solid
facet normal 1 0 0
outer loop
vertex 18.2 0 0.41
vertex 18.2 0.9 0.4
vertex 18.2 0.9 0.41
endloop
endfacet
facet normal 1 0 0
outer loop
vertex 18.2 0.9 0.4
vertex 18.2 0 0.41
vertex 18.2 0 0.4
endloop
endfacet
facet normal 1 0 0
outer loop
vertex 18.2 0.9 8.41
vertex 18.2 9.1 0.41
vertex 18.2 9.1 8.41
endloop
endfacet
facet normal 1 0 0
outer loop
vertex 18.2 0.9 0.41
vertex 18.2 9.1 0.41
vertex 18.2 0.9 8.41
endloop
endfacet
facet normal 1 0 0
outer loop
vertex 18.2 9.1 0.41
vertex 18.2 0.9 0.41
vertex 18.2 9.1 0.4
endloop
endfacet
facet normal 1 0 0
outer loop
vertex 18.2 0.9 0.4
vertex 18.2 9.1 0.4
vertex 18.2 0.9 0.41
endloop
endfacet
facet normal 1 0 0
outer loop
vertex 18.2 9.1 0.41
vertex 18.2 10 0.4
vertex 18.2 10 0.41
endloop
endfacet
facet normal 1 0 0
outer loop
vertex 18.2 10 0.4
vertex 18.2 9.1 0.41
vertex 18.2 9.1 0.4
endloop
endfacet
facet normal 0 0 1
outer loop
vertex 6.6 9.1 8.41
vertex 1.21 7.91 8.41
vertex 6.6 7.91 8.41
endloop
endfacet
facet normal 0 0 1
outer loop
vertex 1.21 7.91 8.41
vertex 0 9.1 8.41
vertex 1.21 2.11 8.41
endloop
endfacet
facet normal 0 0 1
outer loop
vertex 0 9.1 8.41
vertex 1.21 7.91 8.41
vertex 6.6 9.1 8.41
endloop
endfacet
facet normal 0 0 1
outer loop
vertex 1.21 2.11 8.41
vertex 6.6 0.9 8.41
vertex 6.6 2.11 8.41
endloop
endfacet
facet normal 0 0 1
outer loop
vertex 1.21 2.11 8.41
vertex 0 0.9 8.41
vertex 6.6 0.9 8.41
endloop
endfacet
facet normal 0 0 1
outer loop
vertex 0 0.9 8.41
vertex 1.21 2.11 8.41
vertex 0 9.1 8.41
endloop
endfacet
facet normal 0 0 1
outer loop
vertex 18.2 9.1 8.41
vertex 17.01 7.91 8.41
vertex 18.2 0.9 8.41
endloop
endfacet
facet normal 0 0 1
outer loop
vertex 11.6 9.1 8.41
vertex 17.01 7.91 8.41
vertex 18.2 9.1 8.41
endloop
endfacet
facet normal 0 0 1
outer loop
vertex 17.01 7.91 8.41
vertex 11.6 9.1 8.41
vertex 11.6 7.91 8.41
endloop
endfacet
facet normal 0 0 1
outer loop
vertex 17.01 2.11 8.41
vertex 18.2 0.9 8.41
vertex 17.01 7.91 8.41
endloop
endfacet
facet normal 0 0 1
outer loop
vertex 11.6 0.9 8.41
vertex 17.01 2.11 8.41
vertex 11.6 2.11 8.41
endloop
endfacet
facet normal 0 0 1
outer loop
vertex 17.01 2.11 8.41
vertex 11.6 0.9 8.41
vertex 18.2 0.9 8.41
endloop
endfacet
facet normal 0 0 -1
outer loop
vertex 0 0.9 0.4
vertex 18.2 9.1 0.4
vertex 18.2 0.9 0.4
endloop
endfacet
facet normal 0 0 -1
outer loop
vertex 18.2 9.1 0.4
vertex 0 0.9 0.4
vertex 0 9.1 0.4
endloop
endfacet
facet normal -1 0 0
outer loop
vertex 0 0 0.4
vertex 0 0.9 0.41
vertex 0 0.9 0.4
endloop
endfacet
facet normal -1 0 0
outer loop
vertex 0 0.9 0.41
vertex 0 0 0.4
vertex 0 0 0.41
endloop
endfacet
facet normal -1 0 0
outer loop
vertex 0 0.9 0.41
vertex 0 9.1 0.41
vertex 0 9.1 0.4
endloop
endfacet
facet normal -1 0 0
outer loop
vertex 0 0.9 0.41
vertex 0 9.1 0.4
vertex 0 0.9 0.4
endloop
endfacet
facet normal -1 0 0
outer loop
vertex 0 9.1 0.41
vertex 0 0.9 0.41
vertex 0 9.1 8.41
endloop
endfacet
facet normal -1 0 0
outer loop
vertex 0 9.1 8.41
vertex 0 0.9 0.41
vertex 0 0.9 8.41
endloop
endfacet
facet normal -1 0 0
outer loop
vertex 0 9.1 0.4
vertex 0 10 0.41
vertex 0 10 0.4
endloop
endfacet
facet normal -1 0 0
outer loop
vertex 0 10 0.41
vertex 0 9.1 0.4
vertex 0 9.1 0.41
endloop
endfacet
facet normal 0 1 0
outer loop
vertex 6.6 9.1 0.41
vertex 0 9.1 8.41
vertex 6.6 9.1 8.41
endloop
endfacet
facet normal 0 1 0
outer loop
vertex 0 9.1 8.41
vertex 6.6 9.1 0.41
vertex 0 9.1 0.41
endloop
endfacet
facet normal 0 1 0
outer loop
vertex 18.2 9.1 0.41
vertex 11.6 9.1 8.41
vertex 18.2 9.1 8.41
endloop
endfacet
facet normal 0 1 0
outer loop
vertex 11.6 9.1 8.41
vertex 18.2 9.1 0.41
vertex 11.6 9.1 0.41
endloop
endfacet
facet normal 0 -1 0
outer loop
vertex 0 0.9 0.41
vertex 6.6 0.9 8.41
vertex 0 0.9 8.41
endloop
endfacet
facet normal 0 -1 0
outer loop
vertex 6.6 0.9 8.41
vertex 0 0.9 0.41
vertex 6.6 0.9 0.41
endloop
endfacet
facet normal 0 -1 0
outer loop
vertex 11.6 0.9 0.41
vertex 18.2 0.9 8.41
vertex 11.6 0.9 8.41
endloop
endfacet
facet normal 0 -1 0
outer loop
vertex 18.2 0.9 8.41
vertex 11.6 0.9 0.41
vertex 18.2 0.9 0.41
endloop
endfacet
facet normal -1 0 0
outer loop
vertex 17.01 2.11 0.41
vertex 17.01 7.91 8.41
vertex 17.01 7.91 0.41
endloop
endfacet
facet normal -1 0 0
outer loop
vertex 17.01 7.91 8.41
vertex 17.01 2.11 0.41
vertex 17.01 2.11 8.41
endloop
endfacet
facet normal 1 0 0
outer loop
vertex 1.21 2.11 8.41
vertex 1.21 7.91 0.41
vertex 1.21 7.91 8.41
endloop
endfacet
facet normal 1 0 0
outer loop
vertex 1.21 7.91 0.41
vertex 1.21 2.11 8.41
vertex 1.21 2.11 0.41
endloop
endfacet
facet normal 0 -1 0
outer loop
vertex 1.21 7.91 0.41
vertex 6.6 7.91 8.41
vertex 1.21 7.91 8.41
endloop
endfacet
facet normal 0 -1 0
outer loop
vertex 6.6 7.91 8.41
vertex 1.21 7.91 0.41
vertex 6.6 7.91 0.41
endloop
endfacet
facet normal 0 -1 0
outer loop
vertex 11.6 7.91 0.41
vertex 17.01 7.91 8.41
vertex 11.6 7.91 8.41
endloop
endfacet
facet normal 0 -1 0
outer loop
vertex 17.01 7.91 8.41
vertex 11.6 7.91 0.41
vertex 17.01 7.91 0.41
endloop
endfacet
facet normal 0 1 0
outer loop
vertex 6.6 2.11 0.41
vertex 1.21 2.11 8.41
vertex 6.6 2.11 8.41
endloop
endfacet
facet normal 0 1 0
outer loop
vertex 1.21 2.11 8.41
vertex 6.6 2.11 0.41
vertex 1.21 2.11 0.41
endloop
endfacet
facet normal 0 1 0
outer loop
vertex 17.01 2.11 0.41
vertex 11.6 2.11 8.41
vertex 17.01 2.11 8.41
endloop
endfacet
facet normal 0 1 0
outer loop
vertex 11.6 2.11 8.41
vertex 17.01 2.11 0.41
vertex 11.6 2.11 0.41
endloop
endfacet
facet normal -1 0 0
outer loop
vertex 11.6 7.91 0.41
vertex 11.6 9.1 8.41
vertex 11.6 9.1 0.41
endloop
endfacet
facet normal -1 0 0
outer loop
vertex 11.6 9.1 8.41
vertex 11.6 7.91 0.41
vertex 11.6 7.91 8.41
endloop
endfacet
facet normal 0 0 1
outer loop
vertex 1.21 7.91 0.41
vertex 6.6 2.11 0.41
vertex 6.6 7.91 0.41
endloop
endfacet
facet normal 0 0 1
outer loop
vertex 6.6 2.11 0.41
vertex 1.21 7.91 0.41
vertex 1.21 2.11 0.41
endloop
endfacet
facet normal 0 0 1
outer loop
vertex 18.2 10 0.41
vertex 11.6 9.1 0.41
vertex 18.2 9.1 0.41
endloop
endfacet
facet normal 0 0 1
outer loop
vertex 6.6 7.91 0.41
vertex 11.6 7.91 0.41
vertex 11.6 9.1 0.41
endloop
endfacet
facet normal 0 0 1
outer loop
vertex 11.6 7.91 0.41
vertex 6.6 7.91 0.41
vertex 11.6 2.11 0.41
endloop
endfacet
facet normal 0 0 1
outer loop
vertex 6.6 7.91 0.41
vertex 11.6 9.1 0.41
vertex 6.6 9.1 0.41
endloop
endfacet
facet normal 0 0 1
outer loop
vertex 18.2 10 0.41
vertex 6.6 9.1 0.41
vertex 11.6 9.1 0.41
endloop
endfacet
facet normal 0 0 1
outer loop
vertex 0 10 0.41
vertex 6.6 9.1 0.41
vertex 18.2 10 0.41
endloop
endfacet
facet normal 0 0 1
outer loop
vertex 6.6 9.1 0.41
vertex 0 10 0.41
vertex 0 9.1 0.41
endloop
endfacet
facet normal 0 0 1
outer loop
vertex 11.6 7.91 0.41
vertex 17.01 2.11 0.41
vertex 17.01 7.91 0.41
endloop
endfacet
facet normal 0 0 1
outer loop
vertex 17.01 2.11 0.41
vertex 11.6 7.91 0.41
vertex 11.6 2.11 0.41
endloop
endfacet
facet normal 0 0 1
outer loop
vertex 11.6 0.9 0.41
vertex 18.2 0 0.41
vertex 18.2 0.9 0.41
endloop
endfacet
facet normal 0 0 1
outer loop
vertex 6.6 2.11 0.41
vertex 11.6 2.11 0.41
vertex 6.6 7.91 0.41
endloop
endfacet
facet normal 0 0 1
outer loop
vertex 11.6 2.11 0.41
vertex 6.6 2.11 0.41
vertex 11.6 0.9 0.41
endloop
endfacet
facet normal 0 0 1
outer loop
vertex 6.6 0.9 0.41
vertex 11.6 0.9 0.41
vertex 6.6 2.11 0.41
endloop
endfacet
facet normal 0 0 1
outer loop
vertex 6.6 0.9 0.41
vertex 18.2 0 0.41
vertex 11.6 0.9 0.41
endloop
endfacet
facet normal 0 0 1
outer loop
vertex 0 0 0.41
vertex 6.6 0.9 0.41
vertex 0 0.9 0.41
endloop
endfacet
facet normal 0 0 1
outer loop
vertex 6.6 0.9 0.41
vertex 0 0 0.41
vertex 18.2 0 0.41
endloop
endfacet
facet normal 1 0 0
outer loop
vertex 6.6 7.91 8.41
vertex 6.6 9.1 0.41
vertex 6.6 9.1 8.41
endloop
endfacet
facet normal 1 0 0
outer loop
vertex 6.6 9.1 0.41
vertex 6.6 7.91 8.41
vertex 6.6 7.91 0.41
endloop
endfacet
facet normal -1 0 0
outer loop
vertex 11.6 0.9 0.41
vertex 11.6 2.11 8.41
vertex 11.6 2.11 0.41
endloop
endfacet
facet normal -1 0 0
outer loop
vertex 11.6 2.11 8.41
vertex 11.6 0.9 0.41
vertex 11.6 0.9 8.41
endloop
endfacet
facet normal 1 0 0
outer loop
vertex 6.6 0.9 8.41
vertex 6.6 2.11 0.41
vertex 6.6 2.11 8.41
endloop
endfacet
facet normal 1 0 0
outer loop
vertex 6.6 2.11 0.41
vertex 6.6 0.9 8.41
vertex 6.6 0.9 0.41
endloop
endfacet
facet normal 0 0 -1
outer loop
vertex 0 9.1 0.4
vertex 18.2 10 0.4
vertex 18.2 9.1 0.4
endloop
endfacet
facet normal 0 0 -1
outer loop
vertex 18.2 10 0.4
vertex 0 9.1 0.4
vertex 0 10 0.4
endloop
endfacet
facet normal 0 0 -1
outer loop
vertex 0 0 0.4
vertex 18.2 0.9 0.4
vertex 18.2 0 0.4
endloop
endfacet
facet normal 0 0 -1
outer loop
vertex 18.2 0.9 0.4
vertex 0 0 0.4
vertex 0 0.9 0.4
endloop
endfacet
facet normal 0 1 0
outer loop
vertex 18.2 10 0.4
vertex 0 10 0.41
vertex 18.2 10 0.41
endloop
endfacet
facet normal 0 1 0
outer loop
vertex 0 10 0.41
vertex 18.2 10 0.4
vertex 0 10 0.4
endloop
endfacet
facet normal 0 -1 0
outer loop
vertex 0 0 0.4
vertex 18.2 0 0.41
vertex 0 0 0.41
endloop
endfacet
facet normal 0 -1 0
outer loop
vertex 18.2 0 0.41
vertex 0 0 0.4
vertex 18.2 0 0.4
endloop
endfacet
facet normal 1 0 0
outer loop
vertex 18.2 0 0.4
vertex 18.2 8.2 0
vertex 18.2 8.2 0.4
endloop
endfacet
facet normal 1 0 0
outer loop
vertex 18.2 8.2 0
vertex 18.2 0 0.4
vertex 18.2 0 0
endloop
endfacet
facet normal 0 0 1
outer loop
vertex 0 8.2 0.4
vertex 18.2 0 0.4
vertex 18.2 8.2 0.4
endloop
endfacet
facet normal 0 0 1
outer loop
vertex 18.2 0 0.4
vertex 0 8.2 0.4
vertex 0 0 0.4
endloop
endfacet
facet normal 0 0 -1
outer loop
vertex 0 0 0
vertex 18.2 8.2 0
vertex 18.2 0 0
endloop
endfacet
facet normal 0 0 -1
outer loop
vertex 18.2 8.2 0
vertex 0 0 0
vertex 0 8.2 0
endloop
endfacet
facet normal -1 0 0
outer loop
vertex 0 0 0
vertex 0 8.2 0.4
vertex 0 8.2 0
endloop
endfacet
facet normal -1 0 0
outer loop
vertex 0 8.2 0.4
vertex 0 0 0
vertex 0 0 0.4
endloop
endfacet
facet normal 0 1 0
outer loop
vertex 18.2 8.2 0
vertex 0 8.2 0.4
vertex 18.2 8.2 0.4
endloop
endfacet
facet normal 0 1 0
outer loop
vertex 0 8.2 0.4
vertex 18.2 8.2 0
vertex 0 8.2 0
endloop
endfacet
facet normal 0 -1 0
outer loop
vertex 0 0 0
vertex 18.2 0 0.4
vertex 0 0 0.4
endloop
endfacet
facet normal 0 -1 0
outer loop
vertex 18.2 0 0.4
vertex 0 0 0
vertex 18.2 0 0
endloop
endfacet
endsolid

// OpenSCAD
// file: ../../Base/PlacementOptions.scad
// Fischertechnik Box Foundation
// Placement Options

// Alignment
NoAlign = 0;
AlignLeft = 1;
AlignBottom = 2;
AlignCenter = 3;
AlignRight = 4;
AlignTop = 5;

// Element rotation degree steps
rotations = [0, -90, -180, -270];

// Rotation
NoRotation = 0;
Rotate0 = 0;
Rotate90 = 1;
Rotate180 = 2;
Rotate270 = 3;

// Docking (seen from above)
NoDock = -1;
DockLeft = 0;
DockTop = 1;
DockRight = 2;
DockCorner = 2;
DockBottom = 3;

// Web corners
LowerLeft = 0;
UpperLeft = 1;
UpperRight = 2;
LowerRight = 3;

// Web position relative to corner
LeftOfCorner = 0;
RightOfCorner = 1;

// Rails direction
Horizontal = true;
Vertical = false;
// file: ../../Base/Boxes.scad
// Fischertechnik Box Foundation
// Pre-designed Boxes

use <Constants.scad>

include <PlacementOptions.scad>

box190Width = 190;
box190Depth = 130;
box130Width = 130;
box130Depth = 95;

// Values are from an original ec3 box
topBottomDifference = 1.5;
outerHeight = 40;
baseThickness = 1.8;
innerHeight = outerHeight - baseThickness;
stackExcess = 5.7;
radius = 3.5;
wallThickness = 1.5;
tolerance = 0.2;

boxWallThickness = wallThickness;
boxBaseThickness = baseThickness;
boxWebWidth = 3.0;

// getBoxWallThickness()
// Gets the wall thickness of a Fischertechnik Box
function getBoxWallThickness() = boxWallThickness;

// getBoxUsageHeight(height = 38.2)
// Gets the usable height of a Fischertechnik box
// height = Outer height of the box from the bottom to the upper edge.
function getBoxUsageHeight(height = outerHeight) = height - baseThickness - stackExcess;

// getBoxInnerHeight()
// Gets the inner height of a Fischertechnik box, including the stack excess
function getBoxInnerHeight() = innerHeight;

// getBoxBaseThickness()
// Gets the thickness of the Fischertechnik box base.
function getBoxBaseThickness() = boxBaseThickness;

// getBoxWebWidth()
// Gets the width of a box web
function getBoxWebWidth() = boxWebWidth;

// getBox190Space()
// Gets the usable inner space of a Box 190 as an x/y-list
function getBox190Space() = [
    box190Width - 2*getBoxWallThickness() - topBottomDifference, 
    box190Depth - 2*getBoxWallThickness() - topBottomDifference ];

// RoundedCornerPlate(width, depth, height, radius)
// Creates a body plate with rounded corners for a box. Used
// also to create the complete box with the hull module.
// width = Width of the plate
// depth = depth of the plate 
// height = thickness of the plate
// radius = radius of the rounded corner
module RoundedCornerPlate(width, depth, height, radius) {
    translate([radius, radius])
    hull() {
        w = width-2*radius;
        d = depth-2*radius;
        cube([w, d, height]);
        cylinder(height, r=radius, $fn=getFragments());
        translate([w, 0])
            cylinder(height, r=radius, $fn=getFragments());
        translate([w, d])
            cylinder(height, r=radius, $fn=getFragments());
        translate([0, d])
            cylinder(height, r=radius, $fn=getFragments());
    }
}

// BoxBase(width, depth)
// Creates an empty stackable Fischertechnik compatible box
// width = Outer width of the box (190, 130, ...)
// depth = Outer depth of the box (130, 95, ...)

module BoxBase(width, depth, height=outerHeight) {    
    thinPlate = 0.01;

    innerHeight = height - baseThickness;    
    
    module Body(tolerance=tolerance) {
        hull() {
            // Bottom with tolerance to fit into the original boxes when stacked
            translate([-wallThickness+tolerance, -wallThickness+tolerance, -baseThickness])
                RoundedCornerPlate(width-topBottomDifference-2*tolerance, depth-topBottomDifference-2*tolerance, thinPlate, radius);
            
            // Top
            translate([-wallThickness-topBottomDifference/2, -wallThickness-topBottomDifference/2, innerHeight-thinPlate])
                RoundedCornerPlate(width, depth, thinPlate, radius);
         }
    }

    module Cutoff() {
        hull() {
            coWidth = width - 2*wallThickness;
            coDepth = depth - 2*wallThickness;
            
            // Bottom
            RoundedCornerPlate(coWidth-topBottomDifference, coDepth-topBottomDifference, thinPlate, radius);

            // Top
            translate([-topBottomDifference/2, -topBottomDifference/2, innerHeight+thinPlate]) 
                RoundedCornerPlate(coWidth, coDepth, thinPlate, radius);
        }
    }
    
    difference() {        
        Body();
        Cutoff();
        stackOffset = innerHeight - stackExcess;
        translate([0, 0, stackOffset + baseThickness])
            Body(tolerance=0);
    }
}

// Creates the Fischertechnik empty box 130x190 mm and places it at position 0,0
// 190x130 are the outer sizes, the inner space is slightly smaller. Use getBox190Space() to get the inner sizes.
// The box is positioned that the usable inner space is at the 0,0,0 position.

module Box190() {
    BoxBase(box190Width, box190Depth);
}

// Gets the usable inner space of a Box 130 as an x/y-list
function getBox130Space() = [
    box130Width - 2*getBoxWallThickness() - topBottomDifference, 
    box130Depth - 2*getBoxWallThickness() - topBottomDifference ];

// Creates the Fischertechnik empty box 95x130 mm and places it at position 0,0
// 190x130 are the outer sizes, the inner space is slightly smaller. Use getBox190Space() to get the inner sizes.
// The box is positioned that the usable inner space is at the 0,0,0 position.

module Box130() {
    BoxBase(box130Width, box130Depth);
}

// Creates a web at the specified box walls
// corner 0 = LowerLeft, 1 = UpperLeft, 2 = UpperRight, 3 = LowerRight
// side 0 = LeftOfCorner, 1 = RightOfCorner
// distance = Distance in mm from the corner
// boxSpace = inner width and depth of the box (default: Box 190)
// webWidth = length of the web (default is 3 mms)
// webThickness = thickness of the web (default is 1 mm)
// height = Height of the web (standard is getBoxUsageHeight())
// sink = How much of the web is sunk into the wall

module BoxWeb(
    corner, 
    side, 
    distance, 
    boxSpace=getBox190Space(), 
    webWidth=getBoxWebWidth(), 
    webThickness=1.0, 
    height=getBoxUsageHeight(),
    sink = getBoxWallThickness()/2) {
    width = (corner % 2 == 0) ? 
            (side == LeftOfCorner ? webWidth : webThickness) :
            (side == LeftOfCorner ? webThickness : webWidth);

    depth = (corner % 2 == 0) ? 
            (side == RightOfCorner ? webWidth : webThickness) :
            (side == RightOfCorner ? webThickness : webWidth);
    
    xDiff = corner == LowerLeft ? 
                (side == LeftOfCorner ? -sink : distance) :
            (corner == UpperLeft ?                
                (side == LeftOfCorner ? distance : -sink) :
            (corner == UpperRight ?
                (side == LeftOfCorner ? boxSpace.x-webWidth+sink : boxSpace.x-distance-webThickness) :
                (side == LeftOfCorner ? boxSpace.x-distance-webThickness: boxSpace.x-webWidth+sink)));

    yDiff = corner == LowerLeft ? 
                (side == RightOfCorner ? -sink : distance) :
            (corner == UpperLeft ?
                (side == RightOfCorner ? boxSpace.y-distance-webThickness : boxSpace.y-webWidth+sink) :
            (corner == UpperRight ?
                (side == RightOfCorner ? boxSpace.y-webWidth+sink : boxSpace.y-distance-webThickness) :
                (side == RightOfCorner ? distance : -sink)));
    
    translate([xDiff, yDiff, -getExcess()])
        cube([width, depth, height + 2*getExcess()]);
}
// file: ../../Base/Rotation.scad
// Fischertechnik Box Foundation
// Geometry Helpers Rotation

include <PlacementOptions.scad>

// getRotatedSpace(space, rotation=NoRotation)
// Rotates the space dependent on the specified rotation

function getRotatedSpace(space, rotation=NoRotation) = [
    (rotation == Rotate90 || rotation == Rotate270) ? space.y : space.x,
    (rotation == Rotate90 || rotation == Rotate270) ? space.x : space.y
];

// Rotates the given space around the fixed left lower corner
// space = the space the children needs as width/depth list [width,depth]
// rotation = 0 Rotate0 degrees, 1 Rotate90 degrees, 2 Rotate180 degrees, 3 Rotate270 degrees (equivalent to -90)

module RotateFix(space, rotation=NoRotation) {
    dy = (rotation == Rotate0 || rotation == Rotate270) ? 0 :
        (rotation == Rotate90) ? space.x :
        space.y;
    dx = (rotation < Rotate180) ? 0 :
        (rotation == Rotate180) ? space.x :
        space.y;
    
    translate([dx, dy, 0])
        rotate([0, 0, rotations[rotation]])
            children();
}
// file: ../../Base/Alignment.scad
// Fischertechnik Box Foundation
// Geometry Helpers Alignment

include <PlacementOptions.scad>

// getAlignedX(elementWidth, spaceWidth, align=AlignRight, offset=0)
// Gets the aligned X offset of an element with the given
// width in the given space.
// elementWidth = The width of the element to positon
// spaceWidth = The space where the element should be aligned
// align = 0 AlignLeft, 1 AlignCenter, 2 AlignRight
// offset = an optional offset from the aligned position. When
// aligned left or centered, then positive values are in X direction.
// When aligned right then positive values are in negative X direction.

function getAlignedX(elementWidth, spaceWidth, align=AlignRight, offset=0) =
    (align == AlignLeft) ?
        offset :
        ((align == AlignCenter) ?
        (spaceWidth - elementWidth)/2 + offset :
        spaceWidth - offset - elementWidth);

// getAlignedY(elementDepth, spaceDepth, align=AlignTop, offset=0)
// Gets the aligned Y offset of an element with the given
// depth in the given space.
// elementDepth = The depth of the element to positon
// spaceDepth = The space where the element should be aligned
// align = 0 AlignBottom, 1 AlignCenter, 2 AlignTop
// offset = an optional offset from the aligned position. When
// aligned bottom or centered, then positive values are in Y direction.
// When aligned top then positive values are in negative Y direction.

function getAlignedY(elementDepth, spaceDepth, align=AlignTop, offset=0) =
    (align == AlignBottom) ?
        offset :
        ((align == AlignCenter) ?
        (spaceDepth - elementDepth)/2 + offset :
        spaceDepth - offset - elementDepth);
// file: ../../Base/Placement.scad
// Fischertechnik Box Foundation
// Geometry Helpers Placement

use <Constants.scad>
use <Alignment.scad>
use <Rotation.scad>
use <Boxes.scad>

include <PlacementOptions.scad>

// Place(x=0, y=0, elementSpace=[0,0], alignX=AlignLeft, alignY=AlignBottom, rotation=Rotate0, boxSpace=getBox190Space())
// Places the child at the specified position
// y = Y-Position. This is a relative position when an X aligment is specified.
// x = X-Position. This is a relative position when an Y aligment is specified.
// elementSpace = space of the element to be placed [x,y]
// alignX = -1=NoAlign, 0 AlignLeft, 1 AlignCenter, 3 AlignRight (elementSpace and boxSpace required!)
// alignY = -1=NoAlign, 2 AlignBottom, 1 AlignCenter, 4 AlignTop (elementSpace and boxSpace required!)
// rotation = 0 Rotate0 0 degrees, 1 Rotate90 90 degrees, 
// 2 Rotate180 180 degrees, 3 Rotate270 270 degrees (equivalent to -90)
// boxSpace = Inner space of the box where the placement occurs [x,y] - default is Box 190x130 inner space

module Place(x=0, y=0, elementSpace=[0,0], 
  alignX=AlignLeft, alignY=AlignBottom, 
  rotation=NoRotation, boxSpace=getBox190Space()) {

    module Position(x, y, space, rotation=Rotate0) {
        translate([x, y, 0])
            RotateFix(space, rotation)
                children();
    }

    space = getRotatedSpace(elementSpace, rotation);
    alignedX = getAlignedX(space.x, boxSpace.x, alignX, x);
    alignedY = getAlignedY(space.y, boxSpace.y, alignY, y);
    Position(alignedX, alignedY, elementSpace, rotation)
        children();
}

// Center(space=getBox130Space(), elementSpace=[0,0])
// space = Space where the children is centered. For cylinder use centered=true and no elementSpace.
// elementSpace = space of the element to be centered [x,y]

module Center(space=getBox190Space(), elementSpace=[0,0]) {
    Place(elementSpace=elementSpace, boxSpace=space, alignX=AlignCenter, alignY=AlignCenter)
        children();
}

// CenterHorizontal(width=0, y=0, offset=0, space=getBox130Space())
// width = Width of the element to be placed.
// y = Y position of the element
// offset = Offset from the center position (negative will be left of the center)
// space = Space where the element is placed

module CenterHorizontal(width=0, y=0, offset=0, space=getBox190Space()) {
    Place(x=offset, y=y, elementSpace=[width, 0], boxSpace=space, alignX=AlignCenter)
        children(0);
}

// CenterVertical(depth=0, x=0, offset=0, space=getBox130Space())
// depth = Depth of the element to be placed.
// x = X position of the element
// offset = Offset from the center position (negative will be down of the center)
// space = Space where the element is placed

module CenterVertical(depth=0, x=0, offset=0, space=getBox190Space()) {
    Place(x=x, y=offset, elementSpace=[0, depth], boxSpace=space, alignY=AlignCenter)
        children(0);
}

// getIsVertical(align)
// True if the specified alignment needs a vertical orientation for a divider (AlignRight, AlignLeft)

function getIsVertical(align) = (align == AlignRight || align == AlignLeft);

// getIsHorizontal(align)
// True if the specified alignment needs a horizontal orientation for a divider (AlignTop, AlignBottom)

function getIsHorizontal(align) = (align == AlignTop || align == AlignBottom);
// file: ../../Elements/AxisClip10.scad
// Fischertechnik Box Library
// Axis for clip 10
// 31023

use <../ModelBase/Simple.scad>
use <../Base/Constants.scad>

/* [Element Parameters] */
height = 23;
clipHeight = 10;

/* [Hidden] */
width = 12;
depth = 12;
upperDiameter = 3.6;

// getAxisClip10Space()
// Gets the space of a n axis for a clip 10 with spring ring (mot2)

function getAxisClip10Space() = [width, depth, height];

// AxisClip10(height, clipHeight)
// Axis for clip 10 with spring ring (mot2)
// height = Height of the complete axis (standard is 23, in mot3 its only 12)
// clipHeight = Height of the part for the clip (standard is 10, in mot3 its only 7)

module AxisClip10(height=height, clipHeight=clipHeight) {
    LeveledAxisWithSpace(height, height-clipHeight, getAxisClip10Space(), diameter=upperDiameter);
}

// Test
color("lightgray")
AxisClip10(height, clipHeight);
// file: ../../Base/Constants.scad
// Fischertechnik Box Foundation
// Constants

// Constant values necessary for multiple elements

// Base constants
dividerThickness = 1.2;
excess = 0.01;
fragments = 90;
tolerance = 0.8;

// Gets the thickness of a divider 
function getDividerThickness() = dividerThickness;

// Gets the excess that is used to merge walls into each other
function getExcess() = excess;

// Gets amount of fragments of a cylinder
function getFragments() = fragments;

// Gets the inner tolerance of a frame to each side
function getTolerance() = tolerance;


// Fischertechnik specific constants
axisDiameter = 4;
axisBottomDiameter = axisDiameter + 1;
axisTolerance = 0.2;
axisLockingLength = 8;

// Gets axis diameter of Fischertechnik axis
function getAxisDiameter() = axisDiameter;

// Gets axis diameter tolerance (subtracted for element axis)
function getAxisTolerance() = axisTolerance;

// Gets the axis diameter for standing axis
function getStandAxisDiameter() = getAxisDiameter() - getAxisTolerance();

// Gets axis bottom diameter for thicker part at the bottom
function getAxisBottomDiameter() = axisBottomDiameter;

// Gets the lengthh of the locking part of a locking axis
function getAxisLockingLength() = axisLockingLength;

// Studs

studHeight = 2.5;
studTolerance = 0.2;

// gets the height of a connecting stud
function getStudHeight() = studHeight;

// gets the connecting stud height tolerance
function getStudTolerance() = studTolerance;

// Dockable Frame with Edge

standardEdgeDistance = 2.5;
standardWebDistance = 11.5;
standardCornerLength = 15;

// gets the standard distance to the wall of the box for dockable frames with webs
function getStandardEdgeDistance() = standardEdgeDistance;

// gets the standard distance of each web to the corner of the dockable frame
function getStandardWebDistance() = standardWebDistance;

// gets the standard length of the corner walls of a dockable frame
function getStandardCornerLength() = standardCornerLength;

// Tubes

tubeWallFactor = 0.8;

// gets the wall thickness of a tube.
function getTubeWallThickness() = tubeWallFactor * getDividerThickness();

// Small Parts and Divider Frame

smallPartsFrameHeight = 20;

// gets the frame height for docked small parts boxes.
function getSmallPartsFrameHeight() = smallPartsFrameHeight;

// Hubs

hubRingDiameter = 19.5;
hubRingLevelDiameter = 21;

// gets the diameter of a tube matching the inner ring of a wheel
function getHubRingDiameter() = hubRingDiameter;

// gets the diameter of a hub tube with a thicker diameter
function getHubRingLevelDiameter() = hubRingLevelDiameter;

// Struts

strutAddLength = 9.0;
strutDepth = 8.0;

// gets the full length of a strut
function getFullStrutLength(length) = length + strutAddLength;

// gets the radius of the end of a strut
function getStrutEndRadius() = strutAddLength / 2;

// gets the the depth of a strut
function getStrutDepth() = strutDepth;
// file: ../../Elements/FrameBlock5TwoStuds.scad
// Fischertechnik Box Library
// Frame for block 5 with two studs
// 37238

use <../Base/Constants.scad>
use <../Base/Placement.scad>
use <../ModelBase/Simple.scad>

/* [Element Parameters] */
count = 1;

/* [Hidden] */
width = 15;
depth = 5;
height = 8;

// getFrameBlock5TwoStudsSpace(count=1)
// Gets the space of a frame for count block 5 with two studs

function getFrameBlock5TwoStudsSpace(count=1) = getFrameOuterVolume([width * count, depth, height]);


// FrameBlock5TwoStuds(count=1)
// Frame for count block 5 with two studs

module FrameBlock5TwoStuds(count=1) {
    space = [
        getFrameBlock5TwoStudsSpace(count).x, 
        depth + 2*getStudHeight(), 
        getFrameBlock5TwoStudsSpace(count).z];
    Space(space);
    volume = [width * count, depth, height];

    CenterVertical(getFrameBlock5TwoStudsSpace(count).y, space=space) {
        difference() {
            Frame(volume);
            cutoffWidth = 5;
            FrameTopCutoffs(volume, count, cutoffWidth);
            FrameBottomCutoffs(volume, count, cutoffWidth);
        }
    }
}

// Tests
color("lightgray")
FrameBlock5TwoStuds(count);
// file: ../TestPrint.scad
// 3D Print Test Base

use <../Base/Constants.scad>

use <../Elements/AxisClip10.scad>

module TestPrint(elementSpace) {
    cube([elementSpace.x, elementSpace.y, 0.4]);
    translate([0,0,0.4+getExcess()]) {
        children();
    }
}

TestPrint(getAxisClip10Space())
    AxisClip10();
// main file
// 3D Print Test
// FrameBlock5TwoStuds

use <../TestPrint.scad>
use <../../Elements/FrameBlock5TwoStuds.scad>

count=1;

TestPrint(getFrameBlock5TwoStudsSpace(count))
    FrameBlock5TwoStuds(count);
